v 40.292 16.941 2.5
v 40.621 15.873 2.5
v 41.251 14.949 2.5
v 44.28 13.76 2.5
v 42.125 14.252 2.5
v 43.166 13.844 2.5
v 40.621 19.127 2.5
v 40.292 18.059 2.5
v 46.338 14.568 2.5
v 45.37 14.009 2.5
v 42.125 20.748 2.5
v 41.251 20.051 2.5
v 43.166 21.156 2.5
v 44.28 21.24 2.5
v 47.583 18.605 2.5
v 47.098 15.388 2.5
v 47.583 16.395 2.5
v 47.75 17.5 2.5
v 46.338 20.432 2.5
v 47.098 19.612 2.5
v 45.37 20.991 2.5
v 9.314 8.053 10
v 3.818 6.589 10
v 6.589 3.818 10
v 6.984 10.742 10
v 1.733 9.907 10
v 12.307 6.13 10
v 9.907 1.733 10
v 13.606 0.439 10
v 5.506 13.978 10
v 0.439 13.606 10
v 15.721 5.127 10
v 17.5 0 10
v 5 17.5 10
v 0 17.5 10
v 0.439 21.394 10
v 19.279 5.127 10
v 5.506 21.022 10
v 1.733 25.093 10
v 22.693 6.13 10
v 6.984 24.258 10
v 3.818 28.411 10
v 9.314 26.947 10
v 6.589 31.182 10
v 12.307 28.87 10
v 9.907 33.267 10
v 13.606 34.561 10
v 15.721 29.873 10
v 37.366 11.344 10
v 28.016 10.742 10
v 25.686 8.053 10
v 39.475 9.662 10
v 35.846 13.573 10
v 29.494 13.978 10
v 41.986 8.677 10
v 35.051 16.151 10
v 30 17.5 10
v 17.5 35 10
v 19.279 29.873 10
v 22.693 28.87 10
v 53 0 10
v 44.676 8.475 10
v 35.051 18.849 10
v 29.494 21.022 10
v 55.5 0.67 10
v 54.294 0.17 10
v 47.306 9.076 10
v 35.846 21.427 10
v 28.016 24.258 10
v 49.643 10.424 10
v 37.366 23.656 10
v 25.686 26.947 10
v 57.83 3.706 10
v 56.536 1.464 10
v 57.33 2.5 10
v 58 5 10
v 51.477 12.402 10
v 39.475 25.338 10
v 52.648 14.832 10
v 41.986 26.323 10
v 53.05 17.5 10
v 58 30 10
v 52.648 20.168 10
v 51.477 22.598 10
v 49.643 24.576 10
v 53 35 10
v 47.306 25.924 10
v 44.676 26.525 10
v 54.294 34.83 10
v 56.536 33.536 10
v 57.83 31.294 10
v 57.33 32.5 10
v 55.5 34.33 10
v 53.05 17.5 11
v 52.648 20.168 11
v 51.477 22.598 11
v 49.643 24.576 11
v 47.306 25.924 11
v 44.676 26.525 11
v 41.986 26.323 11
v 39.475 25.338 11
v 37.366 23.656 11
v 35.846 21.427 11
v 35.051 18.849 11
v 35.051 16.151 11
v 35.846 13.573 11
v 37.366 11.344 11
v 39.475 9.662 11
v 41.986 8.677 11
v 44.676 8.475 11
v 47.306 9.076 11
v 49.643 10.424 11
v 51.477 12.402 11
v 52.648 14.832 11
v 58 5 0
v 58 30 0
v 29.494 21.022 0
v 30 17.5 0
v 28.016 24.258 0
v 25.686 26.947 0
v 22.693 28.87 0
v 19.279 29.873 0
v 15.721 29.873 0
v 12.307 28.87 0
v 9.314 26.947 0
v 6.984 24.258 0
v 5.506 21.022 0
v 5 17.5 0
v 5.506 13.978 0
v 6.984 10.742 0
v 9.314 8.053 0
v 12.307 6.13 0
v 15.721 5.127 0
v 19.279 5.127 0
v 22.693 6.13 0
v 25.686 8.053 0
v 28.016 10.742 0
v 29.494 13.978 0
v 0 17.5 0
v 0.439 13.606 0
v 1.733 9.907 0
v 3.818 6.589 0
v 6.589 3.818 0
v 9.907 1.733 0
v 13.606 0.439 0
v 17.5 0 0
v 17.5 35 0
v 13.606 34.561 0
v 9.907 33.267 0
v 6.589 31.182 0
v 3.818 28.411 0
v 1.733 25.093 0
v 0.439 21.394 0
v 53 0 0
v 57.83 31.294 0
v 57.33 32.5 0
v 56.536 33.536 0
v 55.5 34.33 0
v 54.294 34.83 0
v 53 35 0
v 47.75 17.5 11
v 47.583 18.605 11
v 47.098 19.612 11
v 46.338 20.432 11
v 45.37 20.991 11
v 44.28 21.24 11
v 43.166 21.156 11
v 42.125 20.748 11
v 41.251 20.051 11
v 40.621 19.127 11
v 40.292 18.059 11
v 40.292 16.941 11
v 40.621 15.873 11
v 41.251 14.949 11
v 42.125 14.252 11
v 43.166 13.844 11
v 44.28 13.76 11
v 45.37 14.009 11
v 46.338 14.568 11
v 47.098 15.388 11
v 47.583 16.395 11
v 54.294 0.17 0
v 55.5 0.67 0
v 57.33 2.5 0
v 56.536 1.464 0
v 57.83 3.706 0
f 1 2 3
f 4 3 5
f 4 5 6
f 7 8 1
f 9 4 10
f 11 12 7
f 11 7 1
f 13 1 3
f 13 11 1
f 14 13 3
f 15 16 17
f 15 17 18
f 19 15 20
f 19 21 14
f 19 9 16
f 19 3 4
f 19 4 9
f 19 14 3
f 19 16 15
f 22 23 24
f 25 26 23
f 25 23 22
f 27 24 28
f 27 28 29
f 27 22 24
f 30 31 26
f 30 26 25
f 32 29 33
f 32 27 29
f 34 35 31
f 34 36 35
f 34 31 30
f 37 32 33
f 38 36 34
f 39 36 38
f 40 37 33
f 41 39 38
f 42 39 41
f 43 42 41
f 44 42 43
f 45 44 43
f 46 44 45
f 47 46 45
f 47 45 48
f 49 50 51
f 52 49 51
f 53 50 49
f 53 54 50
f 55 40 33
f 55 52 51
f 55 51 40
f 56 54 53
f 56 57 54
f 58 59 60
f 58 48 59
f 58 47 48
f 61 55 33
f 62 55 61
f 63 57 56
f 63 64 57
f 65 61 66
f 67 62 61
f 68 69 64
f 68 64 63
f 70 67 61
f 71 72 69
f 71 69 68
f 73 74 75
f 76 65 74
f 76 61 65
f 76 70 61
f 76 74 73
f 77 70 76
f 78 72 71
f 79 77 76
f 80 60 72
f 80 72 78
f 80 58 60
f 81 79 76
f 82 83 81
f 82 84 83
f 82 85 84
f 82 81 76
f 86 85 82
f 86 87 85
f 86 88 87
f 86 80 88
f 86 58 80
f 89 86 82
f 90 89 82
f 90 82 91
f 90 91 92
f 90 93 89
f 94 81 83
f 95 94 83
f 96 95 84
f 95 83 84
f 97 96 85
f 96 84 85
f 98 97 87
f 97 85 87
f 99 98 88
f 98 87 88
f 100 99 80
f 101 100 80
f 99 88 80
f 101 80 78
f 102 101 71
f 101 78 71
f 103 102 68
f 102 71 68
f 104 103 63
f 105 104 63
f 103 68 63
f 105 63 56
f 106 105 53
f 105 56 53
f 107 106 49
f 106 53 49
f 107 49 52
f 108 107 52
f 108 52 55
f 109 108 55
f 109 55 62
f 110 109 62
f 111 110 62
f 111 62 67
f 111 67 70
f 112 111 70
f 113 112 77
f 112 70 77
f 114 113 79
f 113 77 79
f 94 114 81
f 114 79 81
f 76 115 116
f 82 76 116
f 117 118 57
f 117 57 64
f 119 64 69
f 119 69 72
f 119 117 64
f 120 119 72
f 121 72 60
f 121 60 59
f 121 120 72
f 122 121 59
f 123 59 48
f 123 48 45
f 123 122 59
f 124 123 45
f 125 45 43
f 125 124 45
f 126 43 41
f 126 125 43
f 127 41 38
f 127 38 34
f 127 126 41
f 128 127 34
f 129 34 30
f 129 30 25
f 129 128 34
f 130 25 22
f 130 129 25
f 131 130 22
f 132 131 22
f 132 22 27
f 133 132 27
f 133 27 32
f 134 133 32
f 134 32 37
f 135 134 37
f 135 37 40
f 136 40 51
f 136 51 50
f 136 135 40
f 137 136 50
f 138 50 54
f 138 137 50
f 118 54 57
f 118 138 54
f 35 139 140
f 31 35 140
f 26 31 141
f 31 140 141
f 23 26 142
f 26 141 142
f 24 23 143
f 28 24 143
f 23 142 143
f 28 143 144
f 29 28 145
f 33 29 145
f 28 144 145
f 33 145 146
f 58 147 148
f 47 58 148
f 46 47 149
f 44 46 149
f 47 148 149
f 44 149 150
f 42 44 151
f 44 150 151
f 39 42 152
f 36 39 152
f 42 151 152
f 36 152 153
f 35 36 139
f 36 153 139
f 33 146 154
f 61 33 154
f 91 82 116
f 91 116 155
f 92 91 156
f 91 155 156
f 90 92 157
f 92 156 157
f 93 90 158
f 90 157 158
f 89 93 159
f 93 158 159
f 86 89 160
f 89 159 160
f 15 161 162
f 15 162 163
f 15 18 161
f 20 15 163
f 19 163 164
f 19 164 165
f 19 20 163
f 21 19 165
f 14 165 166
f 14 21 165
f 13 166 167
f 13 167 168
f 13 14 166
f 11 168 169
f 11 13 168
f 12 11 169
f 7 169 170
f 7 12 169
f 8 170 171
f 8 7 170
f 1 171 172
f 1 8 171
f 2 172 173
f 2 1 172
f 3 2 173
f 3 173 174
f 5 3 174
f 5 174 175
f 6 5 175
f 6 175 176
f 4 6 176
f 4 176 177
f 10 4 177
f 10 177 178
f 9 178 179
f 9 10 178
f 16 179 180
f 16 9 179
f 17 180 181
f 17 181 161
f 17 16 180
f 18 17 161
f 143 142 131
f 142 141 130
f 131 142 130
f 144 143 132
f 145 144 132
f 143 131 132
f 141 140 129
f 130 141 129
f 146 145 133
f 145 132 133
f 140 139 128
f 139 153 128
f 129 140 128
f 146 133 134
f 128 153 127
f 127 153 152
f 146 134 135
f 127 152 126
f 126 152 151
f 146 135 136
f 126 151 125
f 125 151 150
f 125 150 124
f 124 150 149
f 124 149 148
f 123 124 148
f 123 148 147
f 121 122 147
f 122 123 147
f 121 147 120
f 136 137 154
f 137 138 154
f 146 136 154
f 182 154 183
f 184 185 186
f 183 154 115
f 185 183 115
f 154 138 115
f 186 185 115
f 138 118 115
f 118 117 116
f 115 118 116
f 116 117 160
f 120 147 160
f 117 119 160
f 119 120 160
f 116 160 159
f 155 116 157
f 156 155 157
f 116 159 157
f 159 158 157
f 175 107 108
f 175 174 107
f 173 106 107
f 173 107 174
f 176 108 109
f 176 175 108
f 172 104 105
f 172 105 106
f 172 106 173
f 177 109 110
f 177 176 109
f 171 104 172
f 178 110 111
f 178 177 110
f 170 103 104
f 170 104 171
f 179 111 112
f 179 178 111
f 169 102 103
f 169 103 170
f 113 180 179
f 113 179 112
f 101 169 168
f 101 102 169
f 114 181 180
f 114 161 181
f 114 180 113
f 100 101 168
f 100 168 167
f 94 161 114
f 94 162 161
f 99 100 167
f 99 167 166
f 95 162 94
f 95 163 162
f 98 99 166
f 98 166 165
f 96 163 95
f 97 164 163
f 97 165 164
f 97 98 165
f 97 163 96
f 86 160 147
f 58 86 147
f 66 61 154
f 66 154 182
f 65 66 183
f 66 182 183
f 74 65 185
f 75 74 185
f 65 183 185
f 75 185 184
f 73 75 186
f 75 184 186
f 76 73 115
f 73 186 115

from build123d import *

# Parameters (mm, degrees)
F0_R     = 12.5
F1_DEPTH = 10
F2_R     = 9.05
F2_R_2   = 3.75
F3_DEPTH = 1
F4_DEPTH = 7.5


with BuildPart() as f1:
    # F0 (on Top) → F1 (new body)
    with BuildSketch(Plane.XY):
        with BuildLine():
            ThreePointArc((0, 17.5), (5.125631, 5.125631), (17.5, 0))
            Line((17.5, 0), (53, 0))
            ThreePointArc((53, 0), (56.535534, 1.464466), (58, 5))
            Line((58, 5), (58, 30))
            ThreePointArc((58, 30), (56.535534, 33.535534), (53, 35))
            Line((53, 35), (17.5, 35))
            ThreePointArc((17.5, 35), (5.125631, 29.874369), (0, 17.5))
        make_face()
        with Locations((17.5, 17.5)):
            Circle(F0_R, mode=Mode.SUBTRACT)
    extrude(amount=F1_DEPTH)

    # F2 (on face) → F3 (join)
    with BuildSketch(Plane.XY.offset(10)):
        with Locations((44, 17.5)):
            Circle(F2_R)
        with Locations((44, 17.5)):
            Circle(F2_R_2, mode=Mode.SUBTRACT)
    extrude(amount=F3_DEPTH)

    # F2 (on face) → F4 (cut)
    with BuildSketch(Plane.XY.offset(10)):
        with Locations((44, 17.5)):
            Circle(F2_R_2)
    extrude(amount=-F4_DEPTH, mode=Mode.SUBTRACT)


solid = f1.part
